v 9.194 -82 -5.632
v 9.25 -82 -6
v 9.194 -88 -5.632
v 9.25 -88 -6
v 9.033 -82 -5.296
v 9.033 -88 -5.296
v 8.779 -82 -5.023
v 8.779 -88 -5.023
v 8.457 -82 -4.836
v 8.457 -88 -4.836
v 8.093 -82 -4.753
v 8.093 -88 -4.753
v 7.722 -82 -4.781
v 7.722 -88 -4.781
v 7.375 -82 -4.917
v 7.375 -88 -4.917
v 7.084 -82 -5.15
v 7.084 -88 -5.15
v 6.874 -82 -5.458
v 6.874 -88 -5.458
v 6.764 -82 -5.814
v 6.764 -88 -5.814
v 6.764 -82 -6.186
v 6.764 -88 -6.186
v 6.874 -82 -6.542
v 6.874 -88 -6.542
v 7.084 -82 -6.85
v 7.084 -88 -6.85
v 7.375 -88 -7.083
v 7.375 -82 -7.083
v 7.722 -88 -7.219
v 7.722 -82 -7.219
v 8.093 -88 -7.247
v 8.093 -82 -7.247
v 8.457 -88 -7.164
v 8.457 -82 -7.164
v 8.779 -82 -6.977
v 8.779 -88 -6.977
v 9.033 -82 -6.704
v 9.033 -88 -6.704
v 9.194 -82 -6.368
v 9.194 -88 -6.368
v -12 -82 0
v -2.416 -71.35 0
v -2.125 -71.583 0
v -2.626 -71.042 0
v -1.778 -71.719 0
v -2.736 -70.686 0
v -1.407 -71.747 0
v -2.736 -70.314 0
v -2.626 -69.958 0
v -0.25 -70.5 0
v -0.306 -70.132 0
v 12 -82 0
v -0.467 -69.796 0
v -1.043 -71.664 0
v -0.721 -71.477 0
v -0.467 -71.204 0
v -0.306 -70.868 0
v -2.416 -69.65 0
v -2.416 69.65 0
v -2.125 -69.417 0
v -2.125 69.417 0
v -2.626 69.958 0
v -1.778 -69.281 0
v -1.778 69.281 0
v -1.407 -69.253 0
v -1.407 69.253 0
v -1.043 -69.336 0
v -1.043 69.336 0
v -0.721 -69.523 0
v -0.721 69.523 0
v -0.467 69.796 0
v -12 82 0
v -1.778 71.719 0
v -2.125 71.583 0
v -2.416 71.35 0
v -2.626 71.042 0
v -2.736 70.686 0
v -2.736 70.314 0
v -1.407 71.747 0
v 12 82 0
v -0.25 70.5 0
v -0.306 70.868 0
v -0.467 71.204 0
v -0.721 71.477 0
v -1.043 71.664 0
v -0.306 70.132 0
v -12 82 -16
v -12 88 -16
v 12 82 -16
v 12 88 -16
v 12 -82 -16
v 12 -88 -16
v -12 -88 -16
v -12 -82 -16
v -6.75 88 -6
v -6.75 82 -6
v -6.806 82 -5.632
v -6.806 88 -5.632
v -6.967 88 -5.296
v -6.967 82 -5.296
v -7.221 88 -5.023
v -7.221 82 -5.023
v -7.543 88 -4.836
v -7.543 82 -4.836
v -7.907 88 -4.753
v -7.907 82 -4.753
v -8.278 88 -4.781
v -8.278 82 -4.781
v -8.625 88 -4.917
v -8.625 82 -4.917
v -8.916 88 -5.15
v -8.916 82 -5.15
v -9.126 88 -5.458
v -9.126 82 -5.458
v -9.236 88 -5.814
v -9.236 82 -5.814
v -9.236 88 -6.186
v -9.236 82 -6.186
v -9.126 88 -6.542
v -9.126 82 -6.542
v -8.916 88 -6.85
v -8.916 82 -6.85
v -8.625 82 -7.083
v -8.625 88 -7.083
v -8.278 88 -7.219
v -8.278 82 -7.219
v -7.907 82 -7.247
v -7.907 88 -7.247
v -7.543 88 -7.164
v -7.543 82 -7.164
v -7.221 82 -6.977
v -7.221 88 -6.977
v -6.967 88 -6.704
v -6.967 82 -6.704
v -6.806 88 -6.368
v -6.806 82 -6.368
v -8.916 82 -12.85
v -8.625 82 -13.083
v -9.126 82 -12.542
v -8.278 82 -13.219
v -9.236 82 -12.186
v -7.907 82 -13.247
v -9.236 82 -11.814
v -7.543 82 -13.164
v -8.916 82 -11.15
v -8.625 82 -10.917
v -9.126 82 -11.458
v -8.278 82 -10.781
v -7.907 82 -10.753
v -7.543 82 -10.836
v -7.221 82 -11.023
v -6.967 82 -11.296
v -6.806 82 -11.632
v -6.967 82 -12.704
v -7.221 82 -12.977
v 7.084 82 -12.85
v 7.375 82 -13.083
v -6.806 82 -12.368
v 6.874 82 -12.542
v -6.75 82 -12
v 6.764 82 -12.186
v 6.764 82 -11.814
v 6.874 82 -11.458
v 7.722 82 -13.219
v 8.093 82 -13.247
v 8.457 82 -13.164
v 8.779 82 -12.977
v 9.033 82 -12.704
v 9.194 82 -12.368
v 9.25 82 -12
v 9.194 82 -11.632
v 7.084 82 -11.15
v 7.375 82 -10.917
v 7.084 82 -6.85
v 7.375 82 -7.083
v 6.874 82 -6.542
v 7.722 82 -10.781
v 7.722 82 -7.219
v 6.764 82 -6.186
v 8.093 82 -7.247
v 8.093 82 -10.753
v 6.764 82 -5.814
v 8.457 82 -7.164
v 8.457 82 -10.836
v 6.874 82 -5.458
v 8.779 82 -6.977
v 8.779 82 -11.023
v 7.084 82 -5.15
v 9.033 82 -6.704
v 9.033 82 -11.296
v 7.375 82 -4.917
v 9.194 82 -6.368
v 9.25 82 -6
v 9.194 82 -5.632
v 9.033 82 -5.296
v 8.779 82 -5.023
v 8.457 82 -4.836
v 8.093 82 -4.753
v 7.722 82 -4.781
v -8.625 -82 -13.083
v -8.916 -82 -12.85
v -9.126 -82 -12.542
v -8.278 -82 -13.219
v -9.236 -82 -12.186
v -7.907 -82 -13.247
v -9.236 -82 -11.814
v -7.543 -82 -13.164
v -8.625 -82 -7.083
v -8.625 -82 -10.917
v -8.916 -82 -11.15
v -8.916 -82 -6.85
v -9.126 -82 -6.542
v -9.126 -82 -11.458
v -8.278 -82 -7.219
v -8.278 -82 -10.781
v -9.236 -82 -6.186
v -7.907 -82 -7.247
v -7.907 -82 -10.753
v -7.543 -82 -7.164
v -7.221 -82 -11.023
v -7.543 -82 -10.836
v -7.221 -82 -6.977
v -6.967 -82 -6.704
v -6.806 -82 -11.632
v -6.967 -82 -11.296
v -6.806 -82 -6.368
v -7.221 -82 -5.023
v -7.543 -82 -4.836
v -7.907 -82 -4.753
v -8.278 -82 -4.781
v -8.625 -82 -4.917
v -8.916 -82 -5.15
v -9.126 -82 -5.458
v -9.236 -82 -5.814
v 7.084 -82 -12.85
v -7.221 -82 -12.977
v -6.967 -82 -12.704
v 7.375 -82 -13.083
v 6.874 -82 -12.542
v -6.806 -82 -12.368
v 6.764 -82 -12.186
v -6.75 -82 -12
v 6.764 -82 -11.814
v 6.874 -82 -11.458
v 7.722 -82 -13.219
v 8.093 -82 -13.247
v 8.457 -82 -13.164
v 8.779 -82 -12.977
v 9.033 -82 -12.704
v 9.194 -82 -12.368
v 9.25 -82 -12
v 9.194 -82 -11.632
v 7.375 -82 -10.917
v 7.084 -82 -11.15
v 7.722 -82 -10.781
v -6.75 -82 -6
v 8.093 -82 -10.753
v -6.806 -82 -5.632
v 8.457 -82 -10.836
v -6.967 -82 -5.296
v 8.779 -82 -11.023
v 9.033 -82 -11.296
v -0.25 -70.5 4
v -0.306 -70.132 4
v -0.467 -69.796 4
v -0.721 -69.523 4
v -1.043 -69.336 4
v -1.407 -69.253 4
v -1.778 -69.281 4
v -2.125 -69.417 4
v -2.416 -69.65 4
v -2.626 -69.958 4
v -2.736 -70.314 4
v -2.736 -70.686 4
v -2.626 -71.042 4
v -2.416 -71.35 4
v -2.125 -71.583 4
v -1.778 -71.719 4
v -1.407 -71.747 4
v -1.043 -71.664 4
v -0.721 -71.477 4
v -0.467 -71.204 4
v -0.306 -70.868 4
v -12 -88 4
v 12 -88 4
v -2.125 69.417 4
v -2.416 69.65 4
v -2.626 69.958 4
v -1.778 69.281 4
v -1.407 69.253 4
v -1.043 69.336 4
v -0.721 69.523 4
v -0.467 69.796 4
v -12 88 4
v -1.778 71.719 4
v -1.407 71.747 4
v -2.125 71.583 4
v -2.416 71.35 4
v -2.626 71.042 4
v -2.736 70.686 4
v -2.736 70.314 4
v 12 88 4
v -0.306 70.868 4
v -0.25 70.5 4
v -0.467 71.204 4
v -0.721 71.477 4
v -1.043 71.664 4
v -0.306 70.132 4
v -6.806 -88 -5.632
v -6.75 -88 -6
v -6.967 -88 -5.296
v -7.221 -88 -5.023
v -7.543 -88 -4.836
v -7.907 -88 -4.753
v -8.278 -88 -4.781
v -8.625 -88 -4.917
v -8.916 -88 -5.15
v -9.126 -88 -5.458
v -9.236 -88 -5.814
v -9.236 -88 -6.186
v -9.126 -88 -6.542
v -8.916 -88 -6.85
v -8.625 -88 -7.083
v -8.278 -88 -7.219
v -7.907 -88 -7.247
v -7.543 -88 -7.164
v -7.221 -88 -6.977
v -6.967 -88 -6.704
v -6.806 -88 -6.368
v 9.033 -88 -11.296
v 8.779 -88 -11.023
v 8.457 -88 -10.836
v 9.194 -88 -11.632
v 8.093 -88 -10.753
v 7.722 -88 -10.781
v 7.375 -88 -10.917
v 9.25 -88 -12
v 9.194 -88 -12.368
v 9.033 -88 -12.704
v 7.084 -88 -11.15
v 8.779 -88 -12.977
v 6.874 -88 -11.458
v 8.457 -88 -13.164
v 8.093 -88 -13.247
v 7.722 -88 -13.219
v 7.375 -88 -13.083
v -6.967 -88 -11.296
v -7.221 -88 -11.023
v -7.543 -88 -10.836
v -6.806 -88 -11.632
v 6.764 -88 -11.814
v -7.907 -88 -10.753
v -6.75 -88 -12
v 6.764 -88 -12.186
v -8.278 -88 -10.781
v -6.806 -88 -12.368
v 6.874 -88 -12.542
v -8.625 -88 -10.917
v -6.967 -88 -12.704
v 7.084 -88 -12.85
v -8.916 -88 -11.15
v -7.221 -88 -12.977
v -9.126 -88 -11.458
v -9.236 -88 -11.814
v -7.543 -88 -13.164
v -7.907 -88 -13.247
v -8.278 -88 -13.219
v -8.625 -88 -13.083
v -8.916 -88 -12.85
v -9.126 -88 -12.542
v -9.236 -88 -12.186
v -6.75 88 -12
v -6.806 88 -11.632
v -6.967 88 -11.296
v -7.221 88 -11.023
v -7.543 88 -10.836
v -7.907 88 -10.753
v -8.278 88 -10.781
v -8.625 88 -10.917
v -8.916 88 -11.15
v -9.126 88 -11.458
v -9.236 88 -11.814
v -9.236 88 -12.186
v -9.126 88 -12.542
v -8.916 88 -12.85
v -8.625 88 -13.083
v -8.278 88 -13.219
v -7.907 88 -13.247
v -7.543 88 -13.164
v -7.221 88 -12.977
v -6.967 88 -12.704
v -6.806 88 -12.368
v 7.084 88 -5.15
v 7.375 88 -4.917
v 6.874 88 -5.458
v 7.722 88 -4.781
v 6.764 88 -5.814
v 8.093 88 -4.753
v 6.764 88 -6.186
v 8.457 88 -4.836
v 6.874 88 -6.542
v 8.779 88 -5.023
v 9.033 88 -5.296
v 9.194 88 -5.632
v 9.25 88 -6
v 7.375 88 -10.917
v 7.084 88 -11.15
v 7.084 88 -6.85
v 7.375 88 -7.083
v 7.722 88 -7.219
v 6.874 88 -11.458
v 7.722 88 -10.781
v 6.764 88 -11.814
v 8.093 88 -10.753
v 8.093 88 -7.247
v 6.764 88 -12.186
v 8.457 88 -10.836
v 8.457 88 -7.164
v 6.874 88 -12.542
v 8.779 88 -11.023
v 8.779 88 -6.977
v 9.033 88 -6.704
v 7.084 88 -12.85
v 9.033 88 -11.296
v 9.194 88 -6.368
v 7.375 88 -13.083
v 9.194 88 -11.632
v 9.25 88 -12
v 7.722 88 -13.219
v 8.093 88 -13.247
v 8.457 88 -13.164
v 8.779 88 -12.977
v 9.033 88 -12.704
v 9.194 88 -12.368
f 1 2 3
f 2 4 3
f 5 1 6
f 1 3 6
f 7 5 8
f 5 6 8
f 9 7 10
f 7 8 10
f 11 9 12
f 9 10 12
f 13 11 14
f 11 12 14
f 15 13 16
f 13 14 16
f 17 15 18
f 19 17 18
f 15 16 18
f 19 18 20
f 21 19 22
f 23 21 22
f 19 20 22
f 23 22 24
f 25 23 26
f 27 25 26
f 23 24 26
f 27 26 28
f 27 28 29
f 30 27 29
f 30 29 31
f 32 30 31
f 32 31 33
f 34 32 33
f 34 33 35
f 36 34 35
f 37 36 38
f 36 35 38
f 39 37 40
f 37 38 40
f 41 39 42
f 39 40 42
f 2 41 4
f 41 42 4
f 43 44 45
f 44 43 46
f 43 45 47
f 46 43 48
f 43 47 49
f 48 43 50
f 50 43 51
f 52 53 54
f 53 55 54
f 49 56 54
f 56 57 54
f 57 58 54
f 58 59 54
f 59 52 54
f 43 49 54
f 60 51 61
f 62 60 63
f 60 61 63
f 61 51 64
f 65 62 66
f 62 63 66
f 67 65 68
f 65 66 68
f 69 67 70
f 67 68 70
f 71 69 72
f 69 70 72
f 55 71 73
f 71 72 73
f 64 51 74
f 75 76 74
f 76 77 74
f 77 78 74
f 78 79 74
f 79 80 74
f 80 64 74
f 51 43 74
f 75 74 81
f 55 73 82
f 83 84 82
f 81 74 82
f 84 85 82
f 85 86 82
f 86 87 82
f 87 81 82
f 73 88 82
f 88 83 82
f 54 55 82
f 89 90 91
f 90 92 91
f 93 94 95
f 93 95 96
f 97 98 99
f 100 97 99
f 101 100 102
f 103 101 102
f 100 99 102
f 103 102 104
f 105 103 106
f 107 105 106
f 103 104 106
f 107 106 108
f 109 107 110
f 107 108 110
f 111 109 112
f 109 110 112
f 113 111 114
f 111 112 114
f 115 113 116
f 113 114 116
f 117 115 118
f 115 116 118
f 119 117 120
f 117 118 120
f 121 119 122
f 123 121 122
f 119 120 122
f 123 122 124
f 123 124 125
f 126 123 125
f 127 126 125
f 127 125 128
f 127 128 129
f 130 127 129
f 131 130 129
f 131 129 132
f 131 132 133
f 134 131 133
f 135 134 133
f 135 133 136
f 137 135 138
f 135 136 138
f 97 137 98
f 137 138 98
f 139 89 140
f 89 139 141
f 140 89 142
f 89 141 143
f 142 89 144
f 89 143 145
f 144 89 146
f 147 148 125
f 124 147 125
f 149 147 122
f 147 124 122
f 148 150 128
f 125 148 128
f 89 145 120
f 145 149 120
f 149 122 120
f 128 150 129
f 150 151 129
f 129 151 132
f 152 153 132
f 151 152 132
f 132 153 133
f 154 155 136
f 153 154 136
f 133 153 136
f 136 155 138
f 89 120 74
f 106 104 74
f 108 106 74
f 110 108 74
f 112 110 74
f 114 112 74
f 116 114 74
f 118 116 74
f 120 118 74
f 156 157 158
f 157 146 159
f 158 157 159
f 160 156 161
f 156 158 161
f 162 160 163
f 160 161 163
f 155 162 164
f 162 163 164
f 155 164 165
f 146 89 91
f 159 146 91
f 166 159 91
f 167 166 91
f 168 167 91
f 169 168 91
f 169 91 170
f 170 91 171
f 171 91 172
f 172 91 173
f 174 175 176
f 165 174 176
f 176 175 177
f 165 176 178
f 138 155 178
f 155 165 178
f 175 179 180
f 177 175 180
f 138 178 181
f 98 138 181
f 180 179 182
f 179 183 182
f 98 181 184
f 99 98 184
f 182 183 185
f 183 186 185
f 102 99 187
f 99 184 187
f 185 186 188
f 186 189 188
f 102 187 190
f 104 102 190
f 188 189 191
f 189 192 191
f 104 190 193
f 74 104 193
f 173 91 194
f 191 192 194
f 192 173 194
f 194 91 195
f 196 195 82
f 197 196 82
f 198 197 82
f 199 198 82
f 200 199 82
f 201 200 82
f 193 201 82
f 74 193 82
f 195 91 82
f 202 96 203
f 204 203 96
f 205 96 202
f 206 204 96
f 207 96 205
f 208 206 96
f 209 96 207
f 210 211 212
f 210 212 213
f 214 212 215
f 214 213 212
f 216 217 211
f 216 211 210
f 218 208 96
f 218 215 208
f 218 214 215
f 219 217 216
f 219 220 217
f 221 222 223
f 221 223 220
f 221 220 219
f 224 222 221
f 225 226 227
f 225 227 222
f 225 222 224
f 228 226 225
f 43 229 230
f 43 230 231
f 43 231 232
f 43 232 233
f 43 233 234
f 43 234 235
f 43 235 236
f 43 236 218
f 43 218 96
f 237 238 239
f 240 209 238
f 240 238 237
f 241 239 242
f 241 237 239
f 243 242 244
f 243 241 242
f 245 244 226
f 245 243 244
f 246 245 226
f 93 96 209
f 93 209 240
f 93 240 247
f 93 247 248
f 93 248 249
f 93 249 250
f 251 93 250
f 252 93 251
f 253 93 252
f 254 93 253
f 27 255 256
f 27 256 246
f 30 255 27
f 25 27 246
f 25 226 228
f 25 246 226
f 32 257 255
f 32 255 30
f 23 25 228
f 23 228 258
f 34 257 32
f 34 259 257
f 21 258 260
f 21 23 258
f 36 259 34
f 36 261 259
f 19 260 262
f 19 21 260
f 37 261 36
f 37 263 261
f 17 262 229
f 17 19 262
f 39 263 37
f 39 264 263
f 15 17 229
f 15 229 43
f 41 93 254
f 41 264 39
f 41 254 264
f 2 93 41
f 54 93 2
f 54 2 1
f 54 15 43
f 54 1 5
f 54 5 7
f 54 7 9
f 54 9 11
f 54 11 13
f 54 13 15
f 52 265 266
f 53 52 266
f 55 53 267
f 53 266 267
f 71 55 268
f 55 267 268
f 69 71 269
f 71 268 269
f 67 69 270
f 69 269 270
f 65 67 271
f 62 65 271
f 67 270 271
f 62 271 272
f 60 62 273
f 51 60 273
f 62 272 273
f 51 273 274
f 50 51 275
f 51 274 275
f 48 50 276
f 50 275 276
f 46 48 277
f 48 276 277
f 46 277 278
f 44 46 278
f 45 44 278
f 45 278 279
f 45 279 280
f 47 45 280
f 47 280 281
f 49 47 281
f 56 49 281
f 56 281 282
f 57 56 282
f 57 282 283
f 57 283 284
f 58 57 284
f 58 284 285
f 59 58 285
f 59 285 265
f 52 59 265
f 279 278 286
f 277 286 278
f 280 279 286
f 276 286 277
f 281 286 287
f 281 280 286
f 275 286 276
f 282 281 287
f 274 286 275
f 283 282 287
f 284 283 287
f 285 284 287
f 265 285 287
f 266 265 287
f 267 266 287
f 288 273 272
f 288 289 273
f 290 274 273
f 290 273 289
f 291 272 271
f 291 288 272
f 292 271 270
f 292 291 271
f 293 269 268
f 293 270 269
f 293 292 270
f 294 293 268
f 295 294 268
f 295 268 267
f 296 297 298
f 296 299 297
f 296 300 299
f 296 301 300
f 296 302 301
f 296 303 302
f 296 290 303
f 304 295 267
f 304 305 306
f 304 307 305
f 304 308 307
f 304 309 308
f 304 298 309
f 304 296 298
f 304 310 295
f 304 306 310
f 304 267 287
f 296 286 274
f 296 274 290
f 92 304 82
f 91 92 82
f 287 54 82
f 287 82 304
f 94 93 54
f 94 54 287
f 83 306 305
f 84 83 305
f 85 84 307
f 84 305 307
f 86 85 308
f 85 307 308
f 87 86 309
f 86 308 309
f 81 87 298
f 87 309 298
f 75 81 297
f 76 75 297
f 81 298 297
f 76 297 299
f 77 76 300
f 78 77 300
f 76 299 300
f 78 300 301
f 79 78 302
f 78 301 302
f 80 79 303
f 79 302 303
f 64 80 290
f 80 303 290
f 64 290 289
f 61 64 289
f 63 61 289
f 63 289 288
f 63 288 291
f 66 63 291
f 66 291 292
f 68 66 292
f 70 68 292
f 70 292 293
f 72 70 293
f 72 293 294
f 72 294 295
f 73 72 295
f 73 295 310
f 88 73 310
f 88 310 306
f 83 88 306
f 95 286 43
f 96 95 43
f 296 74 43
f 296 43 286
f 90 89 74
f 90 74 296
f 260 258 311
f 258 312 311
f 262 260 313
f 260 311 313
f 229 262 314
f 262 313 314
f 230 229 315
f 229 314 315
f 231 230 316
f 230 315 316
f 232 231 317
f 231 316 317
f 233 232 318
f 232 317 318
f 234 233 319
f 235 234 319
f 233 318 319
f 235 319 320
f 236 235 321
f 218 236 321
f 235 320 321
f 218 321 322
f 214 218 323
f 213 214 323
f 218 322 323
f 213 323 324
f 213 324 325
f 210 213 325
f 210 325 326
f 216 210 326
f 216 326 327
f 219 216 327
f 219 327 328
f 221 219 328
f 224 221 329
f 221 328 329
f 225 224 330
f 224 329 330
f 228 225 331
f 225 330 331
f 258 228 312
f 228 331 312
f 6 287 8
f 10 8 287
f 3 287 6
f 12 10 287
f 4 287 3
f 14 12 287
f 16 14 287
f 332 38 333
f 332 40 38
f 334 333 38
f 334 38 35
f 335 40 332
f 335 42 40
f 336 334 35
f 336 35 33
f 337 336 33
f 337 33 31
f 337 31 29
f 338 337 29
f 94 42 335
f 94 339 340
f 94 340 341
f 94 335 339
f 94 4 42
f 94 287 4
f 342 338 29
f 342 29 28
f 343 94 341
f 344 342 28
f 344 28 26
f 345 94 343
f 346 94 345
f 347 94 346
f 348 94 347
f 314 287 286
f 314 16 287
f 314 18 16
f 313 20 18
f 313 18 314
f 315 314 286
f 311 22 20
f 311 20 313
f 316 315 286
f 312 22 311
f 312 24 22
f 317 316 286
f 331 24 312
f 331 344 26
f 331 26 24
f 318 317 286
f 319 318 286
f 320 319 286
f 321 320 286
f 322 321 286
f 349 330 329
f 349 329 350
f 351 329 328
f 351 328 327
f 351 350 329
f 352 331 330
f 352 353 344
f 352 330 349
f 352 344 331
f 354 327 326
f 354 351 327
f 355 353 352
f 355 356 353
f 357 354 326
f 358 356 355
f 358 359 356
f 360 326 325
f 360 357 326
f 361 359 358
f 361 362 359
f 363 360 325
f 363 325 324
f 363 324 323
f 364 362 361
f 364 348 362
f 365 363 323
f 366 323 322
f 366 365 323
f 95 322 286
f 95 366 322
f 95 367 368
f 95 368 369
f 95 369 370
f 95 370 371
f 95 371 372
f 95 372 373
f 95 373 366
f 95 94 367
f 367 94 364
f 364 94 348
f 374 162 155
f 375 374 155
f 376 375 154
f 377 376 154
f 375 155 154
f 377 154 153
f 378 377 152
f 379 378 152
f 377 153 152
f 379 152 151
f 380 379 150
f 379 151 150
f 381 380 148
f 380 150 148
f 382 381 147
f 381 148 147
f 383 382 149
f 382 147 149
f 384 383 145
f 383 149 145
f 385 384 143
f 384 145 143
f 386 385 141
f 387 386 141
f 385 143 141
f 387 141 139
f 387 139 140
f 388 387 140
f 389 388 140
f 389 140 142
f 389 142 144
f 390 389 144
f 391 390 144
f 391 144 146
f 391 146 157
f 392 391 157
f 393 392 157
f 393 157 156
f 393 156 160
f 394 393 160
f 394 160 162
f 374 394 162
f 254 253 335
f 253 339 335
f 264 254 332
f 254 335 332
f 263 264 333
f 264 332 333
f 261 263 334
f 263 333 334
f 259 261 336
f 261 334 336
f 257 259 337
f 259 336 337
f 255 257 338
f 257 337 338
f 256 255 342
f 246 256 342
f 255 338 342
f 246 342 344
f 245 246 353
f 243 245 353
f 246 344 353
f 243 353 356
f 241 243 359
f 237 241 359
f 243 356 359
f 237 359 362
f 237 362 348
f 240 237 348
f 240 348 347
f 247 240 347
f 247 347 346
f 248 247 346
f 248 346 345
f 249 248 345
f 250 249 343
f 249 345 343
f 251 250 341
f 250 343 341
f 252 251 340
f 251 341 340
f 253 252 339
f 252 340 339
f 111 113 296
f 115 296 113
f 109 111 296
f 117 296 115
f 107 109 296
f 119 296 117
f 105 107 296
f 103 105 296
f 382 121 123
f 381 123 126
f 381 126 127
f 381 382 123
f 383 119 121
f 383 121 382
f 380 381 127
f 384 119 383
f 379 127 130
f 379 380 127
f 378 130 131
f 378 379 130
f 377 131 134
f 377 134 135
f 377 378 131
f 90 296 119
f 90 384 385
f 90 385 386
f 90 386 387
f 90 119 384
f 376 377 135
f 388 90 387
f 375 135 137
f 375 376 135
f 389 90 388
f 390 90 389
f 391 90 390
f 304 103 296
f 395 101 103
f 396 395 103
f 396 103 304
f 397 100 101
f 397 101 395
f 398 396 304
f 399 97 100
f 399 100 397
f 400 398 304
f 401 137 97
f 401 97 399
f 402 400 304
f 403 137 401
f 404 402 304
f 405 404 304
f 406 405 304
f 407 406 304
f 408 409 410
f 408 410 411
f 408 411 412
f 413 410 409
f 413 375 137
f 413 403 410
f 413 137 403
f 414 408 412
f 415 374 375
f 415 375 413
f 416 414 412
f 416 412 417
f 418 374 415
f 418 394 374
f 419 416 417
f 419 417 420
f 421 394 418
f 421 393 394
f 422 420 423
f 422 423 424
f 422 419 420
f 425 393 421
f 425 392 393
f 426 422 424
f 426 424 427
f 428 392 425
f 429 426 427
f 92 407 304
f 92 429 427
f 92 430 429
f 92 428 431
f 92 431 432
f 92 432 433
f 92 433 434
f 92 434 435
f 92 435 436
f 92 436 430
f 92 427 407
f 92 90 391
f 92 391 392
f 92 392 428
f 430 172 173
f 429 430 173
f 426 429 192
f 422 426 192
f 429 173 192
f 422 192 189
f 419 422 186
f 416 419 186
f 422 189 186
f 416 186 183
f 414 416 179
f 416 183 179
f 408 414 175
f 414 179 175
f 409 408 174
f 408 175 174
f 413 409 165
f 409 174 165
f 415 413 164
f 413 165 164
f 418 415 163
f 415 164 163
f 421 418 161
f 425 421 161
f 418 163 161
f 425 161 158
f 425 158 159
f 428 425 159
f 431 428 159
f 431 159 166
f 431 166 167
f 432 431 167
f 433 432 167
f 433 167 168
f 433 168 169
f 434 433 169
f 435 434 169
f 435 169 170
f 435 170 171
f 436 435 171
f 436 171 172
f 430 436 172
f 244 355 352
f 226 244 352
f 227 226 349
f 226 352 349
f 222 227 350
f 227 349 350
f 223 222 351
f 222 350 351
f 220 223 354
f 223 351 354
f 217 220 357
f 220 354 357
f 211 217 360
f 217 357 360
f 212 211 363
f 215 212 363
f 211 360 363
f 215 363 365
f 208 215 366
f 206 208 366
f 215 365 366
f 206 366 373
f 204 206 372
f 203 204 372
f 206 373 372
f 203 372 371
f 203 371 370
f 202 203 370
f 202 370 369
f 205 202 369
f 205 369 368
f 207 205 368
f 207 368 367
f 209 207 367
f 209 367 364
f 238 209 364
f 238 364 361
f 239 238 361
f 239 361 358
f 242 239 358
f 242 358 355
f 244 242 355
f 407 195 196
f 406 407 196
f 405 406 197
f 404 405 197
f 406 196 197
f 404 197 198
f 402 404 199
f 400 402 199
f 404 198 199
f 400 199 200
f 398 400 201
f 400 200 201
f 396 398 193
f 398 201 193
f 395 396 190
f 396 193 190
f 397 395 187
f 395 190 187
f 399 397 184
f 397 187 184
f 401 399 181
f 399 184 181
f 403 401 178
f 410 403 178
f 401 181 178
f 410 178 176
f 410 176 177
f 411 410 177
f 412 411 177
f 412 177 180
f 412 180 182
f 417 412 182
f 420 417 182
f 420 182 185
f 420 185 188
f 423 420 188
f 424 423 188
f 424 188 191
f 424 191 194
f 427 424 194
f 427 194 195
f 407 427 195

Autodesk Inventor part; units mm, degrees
ref_plane "YZ Plane" through (0, 0, 0) normal (1, 0, 0) x (0, 1, 0)
ref_plane "XZ Plane" through (0, 0, 0) normal (0, 1, 0) x (-1, 0, 0)
ref_plane "XY Plane" through (0, 0, 0) normal (0, 0, 1) x (1, 0, 0)
sketch "스케치1" plane through (0, 0, 0) normal (0, 0, 1) x (1, 0, 0)
  line L0 (-12, 88) -> (12, 88)
  line L1 (12, 88) -> (12, -88)
  line L2 (12, -88) -> (-12, -88)
  line L3 (-12, -88) -> (-12, 88)
  line L4 (-12, 88) -> (12, -88) construction
  line L5 (12, 88) -> (-12, -88) construction
  point P0 (0, 0)
  dimension "d0" = 24
  dimension "d1" = 176
extrude "돌출1" add sketch "스케치1" along normal blind 4
sketch "스케치2" plane through (12, -88, 0) normal (1, 0, 0) x (0, 0, -1)
  line L0 (0, 0) -> (0, 176) projected
  line L1 (0, 176) -> (-4, 176) projected
  line L2 (-4, 0) -> (-4, 176) projected
  line L3 (0, 0) -> (-4, 0) projected
  line L4 (-4, 0) -> (-4, 176) projected
  line L5 (-4, 176) -> (16, 176)
  line L6 (16, 176) -> (16, 170)
  line L7 (16, 170) -> (-4, 170)
  line L8 (-4, 170) -> (-4, 176)
  line L9 (-4, 0) -> (16, 0)
  line L10 (16, 0) -> (16, 6)
  line L11 (16, 6) -> (-4, 6)
  line L12 (-4, 6) -> (-4, 0)
  point P0 (0, 88)
  point P1 (0, 6)
  point P2 (0, 170)
  dimension "d4" = 20
  dimension "d5" = 6
  dimension "d6" = 20
  dimension "d7" = 6
extrude "돌출2" add sketch "스케치2" against normal up to surface (24 mm away) contours L0 L11 L10 L9 | L0 L5 L6 L7
sketch "스케치3" plane through (-12, -88, 4) normal (0, -1, 0) x (1, 0, 0)
  line L0 (24, -20) -> (24, 0) projected
  line L1 (0, 0) -> (24, 0) projected
  line L2 (0, 0) -> (0, -20) projected
  line L3 (24, -20) -> (0, -20) projected
  line L4 (4, -16) -> (4, -4)
  line L5 (4, -4) -> (20, -4)
  line L6 (20, -4) -> (20, -16)
  line L7 (20, -16) -> (4, -16)
  circle A0 centre (20, -16) radius 1.25
  circle A1 centre (4, -16) radius 1.25
  circle A2 centre (20, -4) radius 1.25
  circle A3 centre (4, -4) radius 1.25
  circle A4 centre (20, -10) radius 1.25
  circle A5 centre (4, -10) radius 1.25
  point P0 (12, -4)
  dimension "d10" = 4
  dimension "d11" = 2.5
  dimension "d12" = 2.5
  dimension "d13" = 2.5
  dimension "d14" = 2.5
  dimension "d15" = 2.5
  dimension "d16" = 2.5
extrude "돌출3" cut sketch "스케치3" against normal through all contours L7 A1 L4 | L4 A1 L7 | A5 L4 | L4 A5 | A0 L6 L7 | L7 L6 A0 | A4 L6 | L6 A4
sketch "스케치6" plane through (0, 0, 4) normal (0, 0, 1) x (1, 0, 0)
  circle A0 centre (-1.5, -70.5) radius 1.25 projected
  line L0 (6, -62) -> (6, -79) projected
  line L1 (-9.5, -79) -> (6, -79) projected
  line L2 (-9.5, -79) -> (-9.5, -62) projected
  line L3 (6, -62) -> (-9.5, -62) projected
  circle A1 centre (-1.5, 70.5) radius 1.25 projected
  line L4 (6, 62) -> (6, 79) projected
  line L5 (6, 62) -> (-9.5, 62) projected
  line L6 (-9.5, 79) -> (-9.5, 62) projected
  line L7 (-9.5, 79) -> (6, 79) projected
  point P0 (0, 0)
extrude "돌출6" cut sketch "스케치6" against normal blind 10 contours A0 | A1
properties part number "Back_Cover" material "LCP 플라스틱"
